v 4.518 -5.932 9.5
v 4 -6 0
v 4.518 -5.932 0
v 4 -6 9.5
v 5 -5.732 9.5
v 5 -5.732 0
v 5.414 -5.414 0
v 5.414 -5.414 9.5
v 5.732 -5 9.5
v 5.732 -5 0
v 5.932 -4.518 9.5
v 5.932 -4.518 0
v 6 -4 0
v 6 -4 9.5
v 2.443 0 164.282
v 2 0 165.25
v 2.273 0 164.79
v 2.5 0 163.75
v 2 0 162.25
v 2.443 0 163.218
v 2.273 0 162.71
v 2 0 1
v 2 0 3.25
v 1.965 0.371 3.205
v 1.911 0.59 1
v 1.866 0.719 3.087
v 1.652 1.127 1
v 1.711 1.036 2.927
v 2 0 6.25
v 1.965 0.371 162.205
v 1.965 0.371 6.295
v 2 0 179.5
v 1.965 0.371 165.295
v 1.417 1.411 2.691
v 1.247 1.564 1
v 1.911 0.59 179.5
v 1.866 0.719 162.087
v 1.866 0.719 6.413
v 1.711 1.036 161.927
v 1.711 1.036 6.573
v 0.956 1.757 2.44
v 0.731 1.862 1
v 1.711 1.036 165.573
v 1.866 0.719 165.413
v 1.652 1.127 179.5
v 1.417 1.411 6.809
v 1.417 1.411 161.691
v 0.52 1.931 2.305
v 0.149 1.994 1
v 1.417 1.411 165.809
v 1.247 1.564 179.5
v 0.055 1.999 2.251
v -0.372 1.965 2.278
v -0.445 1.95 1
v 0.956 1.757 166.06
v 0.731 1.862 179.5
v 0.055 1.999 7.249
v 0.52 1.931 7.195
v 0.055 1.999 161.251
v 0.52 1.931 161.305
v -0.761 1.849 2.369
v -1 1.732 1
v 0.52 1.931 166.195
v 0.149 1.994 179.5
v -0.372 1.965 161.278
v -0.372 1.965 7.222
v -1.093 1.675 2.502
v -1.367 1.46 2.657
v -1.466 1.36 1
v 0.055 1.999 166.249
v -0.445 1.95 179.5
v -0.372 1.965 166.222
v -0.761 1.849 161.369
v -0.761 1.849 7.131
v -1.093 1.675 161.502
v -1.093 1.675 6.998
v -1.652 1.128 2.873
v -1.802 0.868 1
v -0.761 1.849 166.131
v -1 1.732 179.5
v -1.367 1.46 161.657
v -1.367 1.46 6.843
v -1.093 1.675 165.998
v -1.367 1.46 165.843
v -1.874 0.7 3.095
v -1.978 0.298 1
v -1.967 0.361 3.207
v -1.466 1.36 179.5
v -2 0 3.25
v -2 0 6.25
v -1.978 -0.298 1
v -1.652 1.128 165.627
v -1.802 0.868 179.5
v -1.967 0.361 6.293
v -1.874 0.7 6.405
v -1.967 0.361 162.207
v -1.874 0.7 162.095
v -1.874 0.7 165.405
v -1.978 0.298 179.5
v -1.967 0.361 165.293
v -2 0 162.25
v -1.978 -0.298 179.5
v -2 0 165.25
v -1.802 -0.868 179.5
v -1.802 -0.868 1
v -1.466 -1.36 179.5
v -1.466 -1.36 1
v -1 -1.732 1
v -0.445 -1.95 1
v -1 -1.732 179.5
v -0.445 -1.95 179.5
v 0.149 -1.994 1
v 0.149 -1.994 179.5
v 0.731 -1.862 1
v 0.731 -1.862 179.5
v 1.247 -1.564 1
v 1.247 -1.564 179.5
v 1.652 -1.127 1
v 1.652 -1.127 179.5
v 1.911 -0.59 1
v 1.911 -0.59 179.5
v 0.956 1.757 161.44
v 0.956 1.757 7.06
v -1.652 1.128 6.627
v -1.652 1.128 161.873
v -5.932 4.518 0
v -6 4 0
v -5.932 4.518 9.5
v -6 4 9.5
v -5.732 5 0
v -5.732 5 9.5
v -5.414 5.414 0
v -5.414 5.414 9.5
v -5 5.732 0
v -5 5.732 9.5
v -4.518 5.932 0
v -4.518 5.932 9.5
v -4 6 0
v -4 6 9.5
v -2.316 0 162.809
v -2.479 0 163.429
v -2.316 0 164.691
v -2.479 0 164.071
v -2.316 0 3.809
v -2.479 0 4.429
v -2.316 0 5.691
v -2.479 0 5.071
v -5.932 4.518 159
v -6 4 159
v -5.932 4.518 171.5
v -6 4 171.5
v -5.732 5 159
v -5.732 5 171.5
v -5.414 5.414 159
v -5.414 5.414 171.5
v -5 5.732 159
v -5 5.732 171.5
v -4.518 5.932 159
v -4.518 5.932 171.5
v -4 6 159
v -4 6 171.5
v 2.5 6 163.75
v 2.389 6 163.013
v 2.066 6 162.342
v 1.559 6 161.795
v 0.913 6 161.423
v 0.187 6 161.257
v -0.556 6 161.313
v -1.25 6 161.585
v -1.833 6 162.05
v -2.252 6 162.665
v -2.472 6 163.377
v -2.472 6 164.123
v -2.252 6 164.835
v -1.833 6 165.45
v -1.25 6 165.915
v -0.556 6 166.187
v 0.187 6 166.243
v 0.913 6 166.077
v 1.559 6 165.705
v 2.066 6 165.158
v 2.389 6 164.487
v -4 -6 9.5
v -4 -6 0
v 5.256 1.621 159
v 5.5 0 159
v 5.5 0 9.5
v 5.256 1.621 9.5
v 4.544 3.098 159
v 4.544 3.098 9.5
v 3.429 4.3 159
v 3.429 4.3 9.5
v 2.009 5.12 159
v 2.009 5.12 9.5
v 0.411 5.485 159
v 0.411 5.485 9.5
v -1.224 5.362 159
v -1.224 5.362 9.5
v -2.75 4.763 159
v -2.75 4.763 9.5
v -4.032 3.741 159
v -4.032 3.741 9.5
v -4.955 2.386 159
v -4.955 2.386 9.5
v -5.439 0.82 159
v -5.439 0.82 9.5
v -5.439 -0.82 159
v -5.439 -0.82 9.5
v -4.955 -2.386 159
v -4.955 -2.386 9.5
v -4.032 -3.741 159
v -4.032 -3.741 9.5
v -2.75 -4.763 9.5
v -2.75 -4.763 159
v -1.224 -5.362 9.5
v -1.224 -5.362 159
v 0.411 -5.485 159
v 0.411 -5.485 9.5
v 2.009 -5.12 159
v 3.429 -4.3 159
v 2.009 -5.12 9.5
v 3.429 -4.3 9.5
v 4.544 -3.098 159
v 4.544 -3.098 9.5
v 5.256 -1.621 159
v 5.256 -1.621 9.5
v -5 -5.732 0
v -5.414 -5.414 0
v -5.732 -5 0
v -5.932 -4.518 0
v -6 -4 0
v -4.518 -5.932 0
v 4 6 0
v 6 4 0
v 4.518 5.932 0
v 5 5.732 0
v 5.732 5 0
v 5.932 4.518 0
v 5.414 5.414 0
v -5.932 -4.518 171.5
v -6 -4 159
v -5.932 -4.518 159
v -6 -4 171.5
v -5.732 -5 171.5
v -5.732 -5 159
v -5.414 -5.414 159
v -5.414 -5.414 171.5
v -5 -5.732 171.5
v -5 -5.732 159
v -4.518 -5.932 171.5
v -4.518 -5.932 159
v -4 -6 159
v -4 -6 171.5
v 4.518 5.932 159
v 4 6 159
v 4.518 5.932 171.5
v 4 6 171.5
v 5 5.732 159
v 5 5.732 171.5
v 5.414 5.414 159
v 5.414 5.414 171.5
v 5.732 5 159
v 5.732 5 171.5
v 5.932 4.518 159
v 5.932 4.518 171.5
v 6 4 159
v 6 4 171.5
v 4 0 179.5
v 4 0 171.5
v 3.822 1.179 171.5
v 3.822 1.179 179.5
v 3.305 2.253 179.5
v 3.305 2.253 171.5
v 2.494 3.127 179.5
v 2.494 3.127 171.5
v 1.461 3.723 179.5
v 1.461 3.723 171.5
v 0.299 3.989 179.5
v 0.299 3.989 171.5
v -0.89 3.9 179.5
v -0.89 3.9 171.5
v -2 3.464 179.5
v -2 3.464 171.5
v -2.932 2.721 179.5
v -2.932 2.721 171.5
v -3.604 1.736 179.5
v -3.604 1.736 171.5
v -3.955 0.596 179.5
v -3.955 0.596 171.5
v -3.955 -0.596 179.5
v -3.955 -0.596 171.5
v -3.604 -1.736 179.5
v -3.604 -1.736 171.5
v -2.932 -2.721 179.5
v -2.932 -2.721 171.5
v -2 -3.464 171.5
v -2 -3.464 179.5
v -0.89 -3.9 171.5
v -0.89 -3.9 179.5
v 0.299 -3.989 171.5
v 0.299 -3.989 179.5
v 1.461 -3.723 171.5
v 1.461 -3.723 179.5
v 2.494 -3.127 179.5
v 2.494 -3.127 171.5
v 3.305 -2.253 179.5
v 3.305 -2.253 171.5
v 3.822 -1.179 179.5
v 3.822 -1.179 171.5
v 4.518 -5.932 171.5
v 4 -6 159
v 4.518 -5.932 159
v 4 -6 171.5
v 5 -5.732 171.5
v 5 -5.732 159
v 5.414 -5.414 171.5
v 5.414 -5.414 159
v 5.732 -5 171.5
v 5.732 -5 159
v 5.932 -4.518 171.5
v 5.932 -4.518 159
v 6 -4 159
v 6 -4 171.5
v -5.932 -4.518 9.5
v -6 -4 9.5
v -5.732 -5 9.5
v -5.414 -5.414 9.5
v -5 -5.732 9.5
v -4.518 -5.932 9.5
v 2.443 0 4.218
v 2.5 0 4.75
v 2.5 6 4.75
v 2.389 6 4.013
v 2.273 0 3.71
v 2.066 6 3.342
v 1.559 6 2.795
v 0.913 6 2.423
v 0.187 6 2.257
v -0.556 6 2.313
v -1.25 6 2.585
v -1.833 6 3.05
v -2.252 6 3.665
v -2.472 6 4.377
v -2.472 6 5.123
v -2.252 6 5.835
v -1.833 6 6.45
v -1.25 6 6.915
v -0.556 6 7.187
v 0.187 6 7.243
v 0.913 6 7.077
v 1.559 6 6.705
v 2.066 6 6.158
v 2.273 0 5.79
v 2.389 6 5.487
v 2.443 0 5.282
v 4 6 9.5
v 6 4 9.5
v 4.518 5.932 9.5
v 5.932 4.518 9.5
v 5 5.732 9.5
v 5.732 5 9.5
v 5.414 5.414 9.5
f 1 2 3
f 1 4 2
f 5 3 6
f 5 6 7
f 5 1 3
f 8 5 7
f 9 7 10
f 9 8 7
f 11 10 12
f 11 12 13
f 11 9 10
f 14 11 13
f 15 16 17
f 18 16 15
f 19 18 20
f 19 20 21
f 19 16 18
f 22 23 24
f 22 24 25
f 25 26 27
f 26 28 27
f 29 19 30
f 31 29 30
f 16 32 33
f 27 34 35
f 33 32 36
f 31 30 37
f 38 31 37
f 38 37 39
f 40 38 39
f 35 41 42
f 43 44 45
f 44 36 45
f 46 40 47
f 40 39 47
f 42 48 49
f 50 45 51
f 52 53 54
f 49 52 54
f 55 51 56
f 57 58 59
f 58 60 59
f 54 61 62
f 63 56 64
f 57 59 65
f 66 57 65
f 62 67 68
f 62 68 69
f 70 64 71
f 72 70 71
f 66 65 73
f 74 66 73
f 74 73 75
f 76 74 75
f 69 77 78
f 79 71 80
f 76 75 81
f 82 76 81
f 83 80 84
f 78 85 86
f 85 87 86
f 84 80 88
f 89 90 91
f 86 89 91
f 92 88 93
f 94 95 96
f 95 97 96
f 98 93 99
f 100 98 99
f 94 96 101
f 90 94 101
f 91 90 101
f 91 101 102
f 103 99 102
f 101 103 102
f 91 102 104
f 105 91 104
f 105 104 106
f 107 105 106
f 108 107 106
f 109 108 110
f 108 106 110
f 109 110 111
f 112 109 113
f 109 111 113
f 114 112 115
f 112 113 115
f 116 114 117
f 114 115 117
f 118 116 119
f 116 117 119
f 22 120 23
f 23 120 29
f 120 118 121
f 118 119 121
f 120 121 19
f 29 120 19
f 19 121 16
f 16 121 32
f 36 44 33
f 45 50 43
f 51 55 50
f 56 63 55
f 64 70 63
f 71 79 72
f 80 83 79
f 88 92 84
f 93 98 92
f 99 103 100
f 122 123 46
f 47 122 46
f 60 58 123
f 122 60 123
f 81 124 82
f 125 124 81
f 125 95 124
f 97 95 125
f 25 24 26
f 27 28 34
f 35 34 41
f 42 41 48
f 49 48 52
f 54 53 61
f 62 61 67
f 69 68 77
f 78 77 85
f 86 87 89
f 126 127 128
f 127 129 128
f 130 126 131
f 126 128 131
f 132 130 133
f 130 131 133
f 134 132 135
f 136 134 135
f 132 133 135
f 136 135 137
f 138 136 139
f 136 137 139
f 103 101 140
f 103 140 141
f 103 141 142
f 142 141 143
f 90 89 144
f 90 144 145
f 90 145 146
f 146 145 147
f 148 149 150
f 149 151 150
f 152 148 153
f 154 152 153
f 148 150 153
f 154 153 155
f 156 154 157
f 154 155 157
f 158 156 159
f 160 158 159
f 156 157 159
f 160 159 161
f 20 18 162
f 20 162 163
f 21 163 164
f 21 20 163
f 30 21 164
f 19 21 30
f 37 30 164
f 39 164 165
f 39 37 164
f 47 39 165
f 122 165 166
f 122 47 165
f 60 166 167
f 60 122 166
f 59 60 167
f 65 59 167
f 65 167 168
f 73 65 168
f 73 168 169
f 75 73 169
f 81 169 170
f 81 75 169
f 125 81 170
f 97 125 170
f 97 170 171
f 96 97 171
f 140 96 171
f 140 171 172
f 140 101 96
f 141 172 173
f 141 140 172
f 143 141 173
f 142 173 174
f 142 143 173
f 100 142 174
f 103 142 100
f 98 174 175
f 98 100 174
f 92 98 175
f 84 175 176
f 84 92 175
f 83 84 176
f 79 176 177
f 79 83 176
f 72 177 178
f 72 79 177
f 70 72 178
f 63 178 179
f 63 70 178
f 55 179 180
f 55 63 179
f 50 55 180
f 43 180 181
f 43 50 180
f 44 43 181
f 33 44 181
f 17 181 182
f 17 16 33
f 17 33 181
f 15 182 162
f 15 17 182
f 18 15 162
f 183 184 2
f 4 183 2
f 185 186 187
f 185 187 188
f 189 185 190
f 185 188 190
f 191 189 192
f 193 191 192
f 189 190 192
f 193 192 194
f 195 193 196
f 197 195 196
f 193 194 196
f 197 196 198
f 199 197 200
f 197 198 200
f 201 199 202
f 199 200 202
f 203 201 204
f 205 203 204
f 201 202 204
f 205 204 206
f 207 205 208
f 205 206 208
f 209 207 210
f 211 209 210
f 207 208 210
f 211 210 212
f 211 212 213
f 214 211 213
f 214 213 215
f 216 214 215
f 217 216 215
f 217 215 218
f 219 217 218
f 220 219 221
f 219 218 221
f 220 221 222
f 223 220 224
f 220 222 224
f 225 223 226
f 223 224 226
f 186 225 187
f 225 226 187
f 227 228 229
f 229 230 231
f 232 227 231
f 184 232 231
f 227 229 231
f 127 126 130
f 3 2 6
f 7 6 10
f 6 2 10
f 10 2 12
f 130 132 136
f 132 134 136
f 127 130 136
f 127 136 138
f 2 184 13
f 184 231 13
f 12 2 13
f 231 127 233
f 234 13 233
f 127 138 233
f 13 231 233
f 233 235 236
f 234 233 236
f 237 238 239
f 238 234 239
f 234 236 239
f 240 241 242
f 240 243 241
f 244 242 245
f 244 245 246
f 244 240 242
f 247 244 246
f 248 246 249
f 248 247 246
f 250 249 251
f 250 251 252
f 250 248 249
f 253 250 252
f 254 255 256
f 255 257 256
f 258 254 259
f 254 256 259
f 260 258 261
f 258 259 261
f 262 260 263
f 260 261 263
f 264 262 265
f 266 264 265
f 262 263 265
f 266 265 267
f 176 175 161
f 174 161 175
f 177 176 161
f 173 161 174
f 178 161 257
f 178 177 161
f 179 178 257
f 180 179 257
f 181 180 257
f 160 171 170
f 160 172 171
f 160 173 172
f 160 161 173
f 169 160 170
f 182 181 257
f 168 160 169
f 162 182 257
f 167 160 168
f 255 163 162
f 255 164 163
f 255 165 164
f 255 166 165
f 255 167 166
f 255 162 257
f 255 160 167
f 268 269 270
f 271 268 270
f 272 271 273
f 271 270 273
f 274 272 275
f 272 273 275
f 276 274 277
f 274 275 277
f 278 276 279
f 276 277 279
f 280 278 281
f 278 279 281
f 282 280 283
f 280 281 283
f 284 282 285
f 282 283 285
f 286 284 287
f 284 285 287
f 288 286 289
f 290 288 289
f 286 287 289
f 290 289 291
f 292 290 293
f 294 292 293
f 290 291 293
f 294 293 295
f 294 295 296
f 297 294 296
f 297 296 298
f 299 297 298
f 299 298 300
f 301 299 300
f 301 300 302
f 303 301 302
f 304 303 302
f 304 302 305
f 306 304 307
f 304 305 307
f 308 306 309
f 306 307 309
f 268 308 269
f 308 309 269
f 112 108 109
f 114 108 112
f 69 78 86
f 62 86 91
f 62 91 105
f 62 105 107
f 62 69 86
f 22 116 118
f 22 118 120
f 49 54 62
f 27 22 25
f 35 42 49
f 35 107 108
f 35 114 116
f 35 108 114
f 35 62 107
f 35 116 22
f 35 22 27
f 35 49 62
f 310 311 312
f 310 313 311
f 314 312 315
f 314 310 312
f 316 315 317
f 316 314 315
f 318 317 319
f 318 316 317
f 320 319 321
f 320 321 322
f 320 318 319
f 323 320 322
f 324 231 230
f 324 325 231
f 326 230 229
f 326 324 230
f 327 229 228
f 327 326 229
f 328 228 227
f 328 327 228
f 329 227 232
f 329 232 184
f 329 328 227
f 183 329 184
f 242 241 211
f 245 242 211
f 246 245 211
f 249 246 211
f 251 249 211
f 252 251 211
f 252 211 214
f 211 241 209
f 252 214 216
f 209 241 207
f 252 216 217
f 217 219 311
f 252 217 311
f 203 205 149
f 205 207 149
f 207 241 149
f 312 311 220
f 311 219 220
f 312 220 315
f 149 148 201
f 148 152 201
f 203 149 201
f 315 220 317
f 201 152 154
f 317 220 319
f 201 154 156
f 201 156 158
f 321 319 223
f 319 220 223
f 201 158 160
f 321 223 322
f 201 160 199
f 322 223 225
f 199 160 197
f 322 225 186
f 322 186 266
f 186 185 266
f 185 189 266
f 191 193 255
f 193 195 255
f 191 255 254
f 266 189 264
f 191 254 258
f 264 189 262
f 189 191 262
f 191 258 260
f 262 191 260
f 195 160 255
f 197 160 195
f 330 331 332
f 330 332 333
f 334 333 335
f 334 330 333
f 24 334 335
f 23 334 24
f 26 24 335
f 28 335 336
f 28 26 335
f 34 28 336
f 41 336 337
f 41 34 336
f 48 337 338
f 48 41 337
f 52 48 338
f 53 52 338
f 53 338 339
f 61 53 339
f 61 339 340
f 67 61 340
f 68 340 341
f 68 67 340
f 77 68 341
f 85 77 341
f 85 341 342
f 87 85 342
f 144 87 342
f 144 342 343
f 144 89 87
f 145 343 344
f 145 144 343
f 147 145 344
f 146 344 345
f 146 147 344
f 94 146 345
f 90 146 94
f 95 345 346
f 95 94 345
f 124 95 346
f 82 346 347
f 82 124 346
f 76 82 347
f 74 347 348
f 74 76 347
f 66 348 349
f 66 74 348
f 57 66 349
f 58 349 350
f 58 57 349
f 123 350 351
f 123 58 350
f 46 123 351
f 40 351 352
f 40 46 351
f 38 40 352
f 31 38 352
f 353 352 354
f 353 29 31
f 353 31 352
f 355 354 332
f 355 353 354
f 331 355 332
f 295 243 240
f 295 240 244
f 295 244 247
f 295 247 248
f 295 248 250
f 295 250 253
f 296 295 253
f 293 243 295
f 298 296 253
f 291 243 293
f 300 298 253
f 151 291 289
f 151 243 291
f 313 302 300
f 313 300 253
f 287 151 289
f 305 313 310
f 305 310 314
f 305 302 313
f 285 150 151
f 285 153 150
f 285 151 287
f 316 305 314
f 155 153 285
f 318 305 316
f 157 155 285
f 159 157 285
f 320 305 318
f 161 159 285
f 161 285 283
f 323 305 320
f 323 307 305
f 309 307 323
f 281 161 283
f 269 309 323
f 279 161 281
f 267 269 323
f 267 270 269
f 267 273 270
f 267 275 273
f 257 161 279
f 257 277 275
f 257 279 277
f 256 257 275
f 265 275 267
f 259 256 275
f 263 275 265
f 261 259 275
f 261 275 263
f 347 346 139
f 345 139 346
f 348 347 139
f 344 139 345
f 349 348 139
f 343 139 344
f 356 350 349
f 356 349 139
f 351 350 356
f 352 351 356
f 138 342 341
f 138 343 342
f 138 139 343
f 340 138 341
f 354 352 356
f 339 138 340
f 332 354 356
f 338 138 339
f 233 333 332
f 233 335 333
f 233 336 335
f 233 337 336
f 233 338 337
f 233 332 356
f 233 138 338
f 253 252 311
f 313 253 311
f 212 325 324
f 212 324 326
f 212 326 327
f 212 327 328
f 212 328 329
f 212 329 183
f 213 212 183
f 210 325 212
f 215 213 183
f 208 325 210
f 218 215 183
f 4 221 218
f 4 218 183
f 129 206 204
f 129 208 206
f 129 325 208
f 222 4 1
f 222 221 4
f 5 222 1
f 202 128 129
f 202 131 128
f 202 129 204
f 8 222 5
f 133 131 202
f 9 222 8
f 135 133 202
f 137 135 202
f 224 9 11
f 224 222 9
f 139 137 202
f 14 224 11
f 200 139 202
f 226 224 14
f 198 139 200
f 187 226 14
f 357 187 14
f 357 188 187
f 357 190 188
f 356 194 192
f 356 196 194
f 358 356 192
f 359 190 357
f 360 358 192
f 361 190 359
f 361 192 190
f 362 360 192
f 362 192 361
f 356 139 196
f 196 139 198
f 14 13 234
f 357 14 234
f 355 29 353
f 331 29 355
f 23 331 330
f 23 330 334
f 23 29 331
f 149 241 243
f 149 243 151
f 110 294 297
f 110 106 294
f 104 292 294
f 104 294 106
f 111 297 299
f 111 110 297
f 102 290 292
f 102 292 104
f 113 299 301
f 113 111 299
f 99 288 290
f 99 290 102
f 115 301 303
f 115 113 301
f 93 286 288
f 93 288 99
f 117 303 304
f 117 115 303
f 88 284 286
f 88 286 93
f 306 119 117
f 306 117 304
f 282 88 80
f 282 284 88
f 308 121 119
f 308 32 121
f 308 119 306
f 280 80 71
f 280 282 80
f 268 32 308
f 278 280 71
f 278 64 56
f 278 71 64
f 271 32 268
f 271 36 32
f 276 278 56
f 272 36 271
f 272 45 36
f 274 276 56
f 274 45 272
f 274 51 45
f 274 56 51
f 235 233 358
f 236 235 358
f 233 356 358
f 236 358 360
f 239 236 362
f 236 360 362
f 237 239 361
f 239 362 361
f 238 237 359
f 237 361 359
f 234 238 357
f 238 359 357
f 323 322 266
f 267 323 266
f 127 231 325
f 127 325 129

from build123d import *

# Parameters (mm, degrees)
SKETCH_1_W          = 12
SKETCH_1_H          = 12
EXTRUDE_1_DEPTH     = 9.5
SKETCH_2_R          = 5.5
EXTRUDE_2_DEPTH     = 149.5
SKETCH_3_W          = 12
SKETCH_3_H          = 12
EXTRUDE_3_DEPTH     = 12.5
SKETCH_4_R          = 4
EXTRUDE_4_DEPTH     = 8
SKETCH_5_R          = 2
CUT_EXTRUDE_1_DEPTH = 178.5
CUT_EXTRUDE_START   = -6
SKETCH_6_R          = 2.5
CUT_EXTRUDE_2_DEPTH = 6
FILLET_1_R          = 2


with BuildPart() as part:
    # 草图1 → 凸台-拉伸1 (new body)
    with BuildSketch(Plane.XY):
        Rectangle(SKETCH_1_W, SKETCH_1_H)
    extrude(amount=EXTRUDE_1_DEPTH)

    # 草图2 → 凸台-拉伸2 (add)
    with BuildSketch(Plane.XY.offset(9.5)):
        Circle(SKETCH_2_R)
    extrude(amount=EXTRUDE_2_DEPTH)

    # 草图3 → 凸台-拉伸3 (add)
    with BuildSketch(Plane.XY.offset(159)):
        Rectangle(SKETCH_3_W, SKETCH_3_H)
    extrude(amount=EXTRUDE_3_DEPTH)

    # 草图4 → 凸台-拉伸4 (add)
    with BuildSketch(Plane.XY.offset(171.5)):
        Circle(SKETCH_4_R)
    extrude(amount=EXTRUDE_4_DEPTH)

    # 草图5 → 切除-拉伸1 (cut)
    with BuildSketch(Plane.XY.offset(179.5)):
        Circle(SKETCH_5_R)
    extrude(amount=-CUT_EXTRUDE_1_DEPTH, mode=Mode.SUBTRACT)

    # 草图6 → 切除-拉伸2 (cut)
    with BuildSketch(Plane(origin=(0, 6, 0), x_dir=(1, 0, 0), z_dir=(0, 1, 0)).offset(CUT_EXTRUDE_START)):
        with Locations((0, -4.75)):
            Circle(SKETCH_6_R)
        with Locations((0, -163.75)):
            Circle(SKETCH_6_R)
    extrude(amount=CUT_EXTRUDE_2_DEPTH, mode=Mode.SUBTRACT)

    # 圆角1
    fillet_1_edges = [part.edges().sort_by_distance(p)[0] for p in [
        (6, -6, 165.25),
        (6, 6, 165.25),
        (-6, 6, 165.25),
        (-6, -6, 165.25),
        (6, -6, 4.75),
        (-6, -6, 4.75),
        (-6, 6, 4.75),
        (6, 6, 4.75),
    ]]
    fillet(fillet_1_edges, radius=FILLET_1_R)


solid = part.part
